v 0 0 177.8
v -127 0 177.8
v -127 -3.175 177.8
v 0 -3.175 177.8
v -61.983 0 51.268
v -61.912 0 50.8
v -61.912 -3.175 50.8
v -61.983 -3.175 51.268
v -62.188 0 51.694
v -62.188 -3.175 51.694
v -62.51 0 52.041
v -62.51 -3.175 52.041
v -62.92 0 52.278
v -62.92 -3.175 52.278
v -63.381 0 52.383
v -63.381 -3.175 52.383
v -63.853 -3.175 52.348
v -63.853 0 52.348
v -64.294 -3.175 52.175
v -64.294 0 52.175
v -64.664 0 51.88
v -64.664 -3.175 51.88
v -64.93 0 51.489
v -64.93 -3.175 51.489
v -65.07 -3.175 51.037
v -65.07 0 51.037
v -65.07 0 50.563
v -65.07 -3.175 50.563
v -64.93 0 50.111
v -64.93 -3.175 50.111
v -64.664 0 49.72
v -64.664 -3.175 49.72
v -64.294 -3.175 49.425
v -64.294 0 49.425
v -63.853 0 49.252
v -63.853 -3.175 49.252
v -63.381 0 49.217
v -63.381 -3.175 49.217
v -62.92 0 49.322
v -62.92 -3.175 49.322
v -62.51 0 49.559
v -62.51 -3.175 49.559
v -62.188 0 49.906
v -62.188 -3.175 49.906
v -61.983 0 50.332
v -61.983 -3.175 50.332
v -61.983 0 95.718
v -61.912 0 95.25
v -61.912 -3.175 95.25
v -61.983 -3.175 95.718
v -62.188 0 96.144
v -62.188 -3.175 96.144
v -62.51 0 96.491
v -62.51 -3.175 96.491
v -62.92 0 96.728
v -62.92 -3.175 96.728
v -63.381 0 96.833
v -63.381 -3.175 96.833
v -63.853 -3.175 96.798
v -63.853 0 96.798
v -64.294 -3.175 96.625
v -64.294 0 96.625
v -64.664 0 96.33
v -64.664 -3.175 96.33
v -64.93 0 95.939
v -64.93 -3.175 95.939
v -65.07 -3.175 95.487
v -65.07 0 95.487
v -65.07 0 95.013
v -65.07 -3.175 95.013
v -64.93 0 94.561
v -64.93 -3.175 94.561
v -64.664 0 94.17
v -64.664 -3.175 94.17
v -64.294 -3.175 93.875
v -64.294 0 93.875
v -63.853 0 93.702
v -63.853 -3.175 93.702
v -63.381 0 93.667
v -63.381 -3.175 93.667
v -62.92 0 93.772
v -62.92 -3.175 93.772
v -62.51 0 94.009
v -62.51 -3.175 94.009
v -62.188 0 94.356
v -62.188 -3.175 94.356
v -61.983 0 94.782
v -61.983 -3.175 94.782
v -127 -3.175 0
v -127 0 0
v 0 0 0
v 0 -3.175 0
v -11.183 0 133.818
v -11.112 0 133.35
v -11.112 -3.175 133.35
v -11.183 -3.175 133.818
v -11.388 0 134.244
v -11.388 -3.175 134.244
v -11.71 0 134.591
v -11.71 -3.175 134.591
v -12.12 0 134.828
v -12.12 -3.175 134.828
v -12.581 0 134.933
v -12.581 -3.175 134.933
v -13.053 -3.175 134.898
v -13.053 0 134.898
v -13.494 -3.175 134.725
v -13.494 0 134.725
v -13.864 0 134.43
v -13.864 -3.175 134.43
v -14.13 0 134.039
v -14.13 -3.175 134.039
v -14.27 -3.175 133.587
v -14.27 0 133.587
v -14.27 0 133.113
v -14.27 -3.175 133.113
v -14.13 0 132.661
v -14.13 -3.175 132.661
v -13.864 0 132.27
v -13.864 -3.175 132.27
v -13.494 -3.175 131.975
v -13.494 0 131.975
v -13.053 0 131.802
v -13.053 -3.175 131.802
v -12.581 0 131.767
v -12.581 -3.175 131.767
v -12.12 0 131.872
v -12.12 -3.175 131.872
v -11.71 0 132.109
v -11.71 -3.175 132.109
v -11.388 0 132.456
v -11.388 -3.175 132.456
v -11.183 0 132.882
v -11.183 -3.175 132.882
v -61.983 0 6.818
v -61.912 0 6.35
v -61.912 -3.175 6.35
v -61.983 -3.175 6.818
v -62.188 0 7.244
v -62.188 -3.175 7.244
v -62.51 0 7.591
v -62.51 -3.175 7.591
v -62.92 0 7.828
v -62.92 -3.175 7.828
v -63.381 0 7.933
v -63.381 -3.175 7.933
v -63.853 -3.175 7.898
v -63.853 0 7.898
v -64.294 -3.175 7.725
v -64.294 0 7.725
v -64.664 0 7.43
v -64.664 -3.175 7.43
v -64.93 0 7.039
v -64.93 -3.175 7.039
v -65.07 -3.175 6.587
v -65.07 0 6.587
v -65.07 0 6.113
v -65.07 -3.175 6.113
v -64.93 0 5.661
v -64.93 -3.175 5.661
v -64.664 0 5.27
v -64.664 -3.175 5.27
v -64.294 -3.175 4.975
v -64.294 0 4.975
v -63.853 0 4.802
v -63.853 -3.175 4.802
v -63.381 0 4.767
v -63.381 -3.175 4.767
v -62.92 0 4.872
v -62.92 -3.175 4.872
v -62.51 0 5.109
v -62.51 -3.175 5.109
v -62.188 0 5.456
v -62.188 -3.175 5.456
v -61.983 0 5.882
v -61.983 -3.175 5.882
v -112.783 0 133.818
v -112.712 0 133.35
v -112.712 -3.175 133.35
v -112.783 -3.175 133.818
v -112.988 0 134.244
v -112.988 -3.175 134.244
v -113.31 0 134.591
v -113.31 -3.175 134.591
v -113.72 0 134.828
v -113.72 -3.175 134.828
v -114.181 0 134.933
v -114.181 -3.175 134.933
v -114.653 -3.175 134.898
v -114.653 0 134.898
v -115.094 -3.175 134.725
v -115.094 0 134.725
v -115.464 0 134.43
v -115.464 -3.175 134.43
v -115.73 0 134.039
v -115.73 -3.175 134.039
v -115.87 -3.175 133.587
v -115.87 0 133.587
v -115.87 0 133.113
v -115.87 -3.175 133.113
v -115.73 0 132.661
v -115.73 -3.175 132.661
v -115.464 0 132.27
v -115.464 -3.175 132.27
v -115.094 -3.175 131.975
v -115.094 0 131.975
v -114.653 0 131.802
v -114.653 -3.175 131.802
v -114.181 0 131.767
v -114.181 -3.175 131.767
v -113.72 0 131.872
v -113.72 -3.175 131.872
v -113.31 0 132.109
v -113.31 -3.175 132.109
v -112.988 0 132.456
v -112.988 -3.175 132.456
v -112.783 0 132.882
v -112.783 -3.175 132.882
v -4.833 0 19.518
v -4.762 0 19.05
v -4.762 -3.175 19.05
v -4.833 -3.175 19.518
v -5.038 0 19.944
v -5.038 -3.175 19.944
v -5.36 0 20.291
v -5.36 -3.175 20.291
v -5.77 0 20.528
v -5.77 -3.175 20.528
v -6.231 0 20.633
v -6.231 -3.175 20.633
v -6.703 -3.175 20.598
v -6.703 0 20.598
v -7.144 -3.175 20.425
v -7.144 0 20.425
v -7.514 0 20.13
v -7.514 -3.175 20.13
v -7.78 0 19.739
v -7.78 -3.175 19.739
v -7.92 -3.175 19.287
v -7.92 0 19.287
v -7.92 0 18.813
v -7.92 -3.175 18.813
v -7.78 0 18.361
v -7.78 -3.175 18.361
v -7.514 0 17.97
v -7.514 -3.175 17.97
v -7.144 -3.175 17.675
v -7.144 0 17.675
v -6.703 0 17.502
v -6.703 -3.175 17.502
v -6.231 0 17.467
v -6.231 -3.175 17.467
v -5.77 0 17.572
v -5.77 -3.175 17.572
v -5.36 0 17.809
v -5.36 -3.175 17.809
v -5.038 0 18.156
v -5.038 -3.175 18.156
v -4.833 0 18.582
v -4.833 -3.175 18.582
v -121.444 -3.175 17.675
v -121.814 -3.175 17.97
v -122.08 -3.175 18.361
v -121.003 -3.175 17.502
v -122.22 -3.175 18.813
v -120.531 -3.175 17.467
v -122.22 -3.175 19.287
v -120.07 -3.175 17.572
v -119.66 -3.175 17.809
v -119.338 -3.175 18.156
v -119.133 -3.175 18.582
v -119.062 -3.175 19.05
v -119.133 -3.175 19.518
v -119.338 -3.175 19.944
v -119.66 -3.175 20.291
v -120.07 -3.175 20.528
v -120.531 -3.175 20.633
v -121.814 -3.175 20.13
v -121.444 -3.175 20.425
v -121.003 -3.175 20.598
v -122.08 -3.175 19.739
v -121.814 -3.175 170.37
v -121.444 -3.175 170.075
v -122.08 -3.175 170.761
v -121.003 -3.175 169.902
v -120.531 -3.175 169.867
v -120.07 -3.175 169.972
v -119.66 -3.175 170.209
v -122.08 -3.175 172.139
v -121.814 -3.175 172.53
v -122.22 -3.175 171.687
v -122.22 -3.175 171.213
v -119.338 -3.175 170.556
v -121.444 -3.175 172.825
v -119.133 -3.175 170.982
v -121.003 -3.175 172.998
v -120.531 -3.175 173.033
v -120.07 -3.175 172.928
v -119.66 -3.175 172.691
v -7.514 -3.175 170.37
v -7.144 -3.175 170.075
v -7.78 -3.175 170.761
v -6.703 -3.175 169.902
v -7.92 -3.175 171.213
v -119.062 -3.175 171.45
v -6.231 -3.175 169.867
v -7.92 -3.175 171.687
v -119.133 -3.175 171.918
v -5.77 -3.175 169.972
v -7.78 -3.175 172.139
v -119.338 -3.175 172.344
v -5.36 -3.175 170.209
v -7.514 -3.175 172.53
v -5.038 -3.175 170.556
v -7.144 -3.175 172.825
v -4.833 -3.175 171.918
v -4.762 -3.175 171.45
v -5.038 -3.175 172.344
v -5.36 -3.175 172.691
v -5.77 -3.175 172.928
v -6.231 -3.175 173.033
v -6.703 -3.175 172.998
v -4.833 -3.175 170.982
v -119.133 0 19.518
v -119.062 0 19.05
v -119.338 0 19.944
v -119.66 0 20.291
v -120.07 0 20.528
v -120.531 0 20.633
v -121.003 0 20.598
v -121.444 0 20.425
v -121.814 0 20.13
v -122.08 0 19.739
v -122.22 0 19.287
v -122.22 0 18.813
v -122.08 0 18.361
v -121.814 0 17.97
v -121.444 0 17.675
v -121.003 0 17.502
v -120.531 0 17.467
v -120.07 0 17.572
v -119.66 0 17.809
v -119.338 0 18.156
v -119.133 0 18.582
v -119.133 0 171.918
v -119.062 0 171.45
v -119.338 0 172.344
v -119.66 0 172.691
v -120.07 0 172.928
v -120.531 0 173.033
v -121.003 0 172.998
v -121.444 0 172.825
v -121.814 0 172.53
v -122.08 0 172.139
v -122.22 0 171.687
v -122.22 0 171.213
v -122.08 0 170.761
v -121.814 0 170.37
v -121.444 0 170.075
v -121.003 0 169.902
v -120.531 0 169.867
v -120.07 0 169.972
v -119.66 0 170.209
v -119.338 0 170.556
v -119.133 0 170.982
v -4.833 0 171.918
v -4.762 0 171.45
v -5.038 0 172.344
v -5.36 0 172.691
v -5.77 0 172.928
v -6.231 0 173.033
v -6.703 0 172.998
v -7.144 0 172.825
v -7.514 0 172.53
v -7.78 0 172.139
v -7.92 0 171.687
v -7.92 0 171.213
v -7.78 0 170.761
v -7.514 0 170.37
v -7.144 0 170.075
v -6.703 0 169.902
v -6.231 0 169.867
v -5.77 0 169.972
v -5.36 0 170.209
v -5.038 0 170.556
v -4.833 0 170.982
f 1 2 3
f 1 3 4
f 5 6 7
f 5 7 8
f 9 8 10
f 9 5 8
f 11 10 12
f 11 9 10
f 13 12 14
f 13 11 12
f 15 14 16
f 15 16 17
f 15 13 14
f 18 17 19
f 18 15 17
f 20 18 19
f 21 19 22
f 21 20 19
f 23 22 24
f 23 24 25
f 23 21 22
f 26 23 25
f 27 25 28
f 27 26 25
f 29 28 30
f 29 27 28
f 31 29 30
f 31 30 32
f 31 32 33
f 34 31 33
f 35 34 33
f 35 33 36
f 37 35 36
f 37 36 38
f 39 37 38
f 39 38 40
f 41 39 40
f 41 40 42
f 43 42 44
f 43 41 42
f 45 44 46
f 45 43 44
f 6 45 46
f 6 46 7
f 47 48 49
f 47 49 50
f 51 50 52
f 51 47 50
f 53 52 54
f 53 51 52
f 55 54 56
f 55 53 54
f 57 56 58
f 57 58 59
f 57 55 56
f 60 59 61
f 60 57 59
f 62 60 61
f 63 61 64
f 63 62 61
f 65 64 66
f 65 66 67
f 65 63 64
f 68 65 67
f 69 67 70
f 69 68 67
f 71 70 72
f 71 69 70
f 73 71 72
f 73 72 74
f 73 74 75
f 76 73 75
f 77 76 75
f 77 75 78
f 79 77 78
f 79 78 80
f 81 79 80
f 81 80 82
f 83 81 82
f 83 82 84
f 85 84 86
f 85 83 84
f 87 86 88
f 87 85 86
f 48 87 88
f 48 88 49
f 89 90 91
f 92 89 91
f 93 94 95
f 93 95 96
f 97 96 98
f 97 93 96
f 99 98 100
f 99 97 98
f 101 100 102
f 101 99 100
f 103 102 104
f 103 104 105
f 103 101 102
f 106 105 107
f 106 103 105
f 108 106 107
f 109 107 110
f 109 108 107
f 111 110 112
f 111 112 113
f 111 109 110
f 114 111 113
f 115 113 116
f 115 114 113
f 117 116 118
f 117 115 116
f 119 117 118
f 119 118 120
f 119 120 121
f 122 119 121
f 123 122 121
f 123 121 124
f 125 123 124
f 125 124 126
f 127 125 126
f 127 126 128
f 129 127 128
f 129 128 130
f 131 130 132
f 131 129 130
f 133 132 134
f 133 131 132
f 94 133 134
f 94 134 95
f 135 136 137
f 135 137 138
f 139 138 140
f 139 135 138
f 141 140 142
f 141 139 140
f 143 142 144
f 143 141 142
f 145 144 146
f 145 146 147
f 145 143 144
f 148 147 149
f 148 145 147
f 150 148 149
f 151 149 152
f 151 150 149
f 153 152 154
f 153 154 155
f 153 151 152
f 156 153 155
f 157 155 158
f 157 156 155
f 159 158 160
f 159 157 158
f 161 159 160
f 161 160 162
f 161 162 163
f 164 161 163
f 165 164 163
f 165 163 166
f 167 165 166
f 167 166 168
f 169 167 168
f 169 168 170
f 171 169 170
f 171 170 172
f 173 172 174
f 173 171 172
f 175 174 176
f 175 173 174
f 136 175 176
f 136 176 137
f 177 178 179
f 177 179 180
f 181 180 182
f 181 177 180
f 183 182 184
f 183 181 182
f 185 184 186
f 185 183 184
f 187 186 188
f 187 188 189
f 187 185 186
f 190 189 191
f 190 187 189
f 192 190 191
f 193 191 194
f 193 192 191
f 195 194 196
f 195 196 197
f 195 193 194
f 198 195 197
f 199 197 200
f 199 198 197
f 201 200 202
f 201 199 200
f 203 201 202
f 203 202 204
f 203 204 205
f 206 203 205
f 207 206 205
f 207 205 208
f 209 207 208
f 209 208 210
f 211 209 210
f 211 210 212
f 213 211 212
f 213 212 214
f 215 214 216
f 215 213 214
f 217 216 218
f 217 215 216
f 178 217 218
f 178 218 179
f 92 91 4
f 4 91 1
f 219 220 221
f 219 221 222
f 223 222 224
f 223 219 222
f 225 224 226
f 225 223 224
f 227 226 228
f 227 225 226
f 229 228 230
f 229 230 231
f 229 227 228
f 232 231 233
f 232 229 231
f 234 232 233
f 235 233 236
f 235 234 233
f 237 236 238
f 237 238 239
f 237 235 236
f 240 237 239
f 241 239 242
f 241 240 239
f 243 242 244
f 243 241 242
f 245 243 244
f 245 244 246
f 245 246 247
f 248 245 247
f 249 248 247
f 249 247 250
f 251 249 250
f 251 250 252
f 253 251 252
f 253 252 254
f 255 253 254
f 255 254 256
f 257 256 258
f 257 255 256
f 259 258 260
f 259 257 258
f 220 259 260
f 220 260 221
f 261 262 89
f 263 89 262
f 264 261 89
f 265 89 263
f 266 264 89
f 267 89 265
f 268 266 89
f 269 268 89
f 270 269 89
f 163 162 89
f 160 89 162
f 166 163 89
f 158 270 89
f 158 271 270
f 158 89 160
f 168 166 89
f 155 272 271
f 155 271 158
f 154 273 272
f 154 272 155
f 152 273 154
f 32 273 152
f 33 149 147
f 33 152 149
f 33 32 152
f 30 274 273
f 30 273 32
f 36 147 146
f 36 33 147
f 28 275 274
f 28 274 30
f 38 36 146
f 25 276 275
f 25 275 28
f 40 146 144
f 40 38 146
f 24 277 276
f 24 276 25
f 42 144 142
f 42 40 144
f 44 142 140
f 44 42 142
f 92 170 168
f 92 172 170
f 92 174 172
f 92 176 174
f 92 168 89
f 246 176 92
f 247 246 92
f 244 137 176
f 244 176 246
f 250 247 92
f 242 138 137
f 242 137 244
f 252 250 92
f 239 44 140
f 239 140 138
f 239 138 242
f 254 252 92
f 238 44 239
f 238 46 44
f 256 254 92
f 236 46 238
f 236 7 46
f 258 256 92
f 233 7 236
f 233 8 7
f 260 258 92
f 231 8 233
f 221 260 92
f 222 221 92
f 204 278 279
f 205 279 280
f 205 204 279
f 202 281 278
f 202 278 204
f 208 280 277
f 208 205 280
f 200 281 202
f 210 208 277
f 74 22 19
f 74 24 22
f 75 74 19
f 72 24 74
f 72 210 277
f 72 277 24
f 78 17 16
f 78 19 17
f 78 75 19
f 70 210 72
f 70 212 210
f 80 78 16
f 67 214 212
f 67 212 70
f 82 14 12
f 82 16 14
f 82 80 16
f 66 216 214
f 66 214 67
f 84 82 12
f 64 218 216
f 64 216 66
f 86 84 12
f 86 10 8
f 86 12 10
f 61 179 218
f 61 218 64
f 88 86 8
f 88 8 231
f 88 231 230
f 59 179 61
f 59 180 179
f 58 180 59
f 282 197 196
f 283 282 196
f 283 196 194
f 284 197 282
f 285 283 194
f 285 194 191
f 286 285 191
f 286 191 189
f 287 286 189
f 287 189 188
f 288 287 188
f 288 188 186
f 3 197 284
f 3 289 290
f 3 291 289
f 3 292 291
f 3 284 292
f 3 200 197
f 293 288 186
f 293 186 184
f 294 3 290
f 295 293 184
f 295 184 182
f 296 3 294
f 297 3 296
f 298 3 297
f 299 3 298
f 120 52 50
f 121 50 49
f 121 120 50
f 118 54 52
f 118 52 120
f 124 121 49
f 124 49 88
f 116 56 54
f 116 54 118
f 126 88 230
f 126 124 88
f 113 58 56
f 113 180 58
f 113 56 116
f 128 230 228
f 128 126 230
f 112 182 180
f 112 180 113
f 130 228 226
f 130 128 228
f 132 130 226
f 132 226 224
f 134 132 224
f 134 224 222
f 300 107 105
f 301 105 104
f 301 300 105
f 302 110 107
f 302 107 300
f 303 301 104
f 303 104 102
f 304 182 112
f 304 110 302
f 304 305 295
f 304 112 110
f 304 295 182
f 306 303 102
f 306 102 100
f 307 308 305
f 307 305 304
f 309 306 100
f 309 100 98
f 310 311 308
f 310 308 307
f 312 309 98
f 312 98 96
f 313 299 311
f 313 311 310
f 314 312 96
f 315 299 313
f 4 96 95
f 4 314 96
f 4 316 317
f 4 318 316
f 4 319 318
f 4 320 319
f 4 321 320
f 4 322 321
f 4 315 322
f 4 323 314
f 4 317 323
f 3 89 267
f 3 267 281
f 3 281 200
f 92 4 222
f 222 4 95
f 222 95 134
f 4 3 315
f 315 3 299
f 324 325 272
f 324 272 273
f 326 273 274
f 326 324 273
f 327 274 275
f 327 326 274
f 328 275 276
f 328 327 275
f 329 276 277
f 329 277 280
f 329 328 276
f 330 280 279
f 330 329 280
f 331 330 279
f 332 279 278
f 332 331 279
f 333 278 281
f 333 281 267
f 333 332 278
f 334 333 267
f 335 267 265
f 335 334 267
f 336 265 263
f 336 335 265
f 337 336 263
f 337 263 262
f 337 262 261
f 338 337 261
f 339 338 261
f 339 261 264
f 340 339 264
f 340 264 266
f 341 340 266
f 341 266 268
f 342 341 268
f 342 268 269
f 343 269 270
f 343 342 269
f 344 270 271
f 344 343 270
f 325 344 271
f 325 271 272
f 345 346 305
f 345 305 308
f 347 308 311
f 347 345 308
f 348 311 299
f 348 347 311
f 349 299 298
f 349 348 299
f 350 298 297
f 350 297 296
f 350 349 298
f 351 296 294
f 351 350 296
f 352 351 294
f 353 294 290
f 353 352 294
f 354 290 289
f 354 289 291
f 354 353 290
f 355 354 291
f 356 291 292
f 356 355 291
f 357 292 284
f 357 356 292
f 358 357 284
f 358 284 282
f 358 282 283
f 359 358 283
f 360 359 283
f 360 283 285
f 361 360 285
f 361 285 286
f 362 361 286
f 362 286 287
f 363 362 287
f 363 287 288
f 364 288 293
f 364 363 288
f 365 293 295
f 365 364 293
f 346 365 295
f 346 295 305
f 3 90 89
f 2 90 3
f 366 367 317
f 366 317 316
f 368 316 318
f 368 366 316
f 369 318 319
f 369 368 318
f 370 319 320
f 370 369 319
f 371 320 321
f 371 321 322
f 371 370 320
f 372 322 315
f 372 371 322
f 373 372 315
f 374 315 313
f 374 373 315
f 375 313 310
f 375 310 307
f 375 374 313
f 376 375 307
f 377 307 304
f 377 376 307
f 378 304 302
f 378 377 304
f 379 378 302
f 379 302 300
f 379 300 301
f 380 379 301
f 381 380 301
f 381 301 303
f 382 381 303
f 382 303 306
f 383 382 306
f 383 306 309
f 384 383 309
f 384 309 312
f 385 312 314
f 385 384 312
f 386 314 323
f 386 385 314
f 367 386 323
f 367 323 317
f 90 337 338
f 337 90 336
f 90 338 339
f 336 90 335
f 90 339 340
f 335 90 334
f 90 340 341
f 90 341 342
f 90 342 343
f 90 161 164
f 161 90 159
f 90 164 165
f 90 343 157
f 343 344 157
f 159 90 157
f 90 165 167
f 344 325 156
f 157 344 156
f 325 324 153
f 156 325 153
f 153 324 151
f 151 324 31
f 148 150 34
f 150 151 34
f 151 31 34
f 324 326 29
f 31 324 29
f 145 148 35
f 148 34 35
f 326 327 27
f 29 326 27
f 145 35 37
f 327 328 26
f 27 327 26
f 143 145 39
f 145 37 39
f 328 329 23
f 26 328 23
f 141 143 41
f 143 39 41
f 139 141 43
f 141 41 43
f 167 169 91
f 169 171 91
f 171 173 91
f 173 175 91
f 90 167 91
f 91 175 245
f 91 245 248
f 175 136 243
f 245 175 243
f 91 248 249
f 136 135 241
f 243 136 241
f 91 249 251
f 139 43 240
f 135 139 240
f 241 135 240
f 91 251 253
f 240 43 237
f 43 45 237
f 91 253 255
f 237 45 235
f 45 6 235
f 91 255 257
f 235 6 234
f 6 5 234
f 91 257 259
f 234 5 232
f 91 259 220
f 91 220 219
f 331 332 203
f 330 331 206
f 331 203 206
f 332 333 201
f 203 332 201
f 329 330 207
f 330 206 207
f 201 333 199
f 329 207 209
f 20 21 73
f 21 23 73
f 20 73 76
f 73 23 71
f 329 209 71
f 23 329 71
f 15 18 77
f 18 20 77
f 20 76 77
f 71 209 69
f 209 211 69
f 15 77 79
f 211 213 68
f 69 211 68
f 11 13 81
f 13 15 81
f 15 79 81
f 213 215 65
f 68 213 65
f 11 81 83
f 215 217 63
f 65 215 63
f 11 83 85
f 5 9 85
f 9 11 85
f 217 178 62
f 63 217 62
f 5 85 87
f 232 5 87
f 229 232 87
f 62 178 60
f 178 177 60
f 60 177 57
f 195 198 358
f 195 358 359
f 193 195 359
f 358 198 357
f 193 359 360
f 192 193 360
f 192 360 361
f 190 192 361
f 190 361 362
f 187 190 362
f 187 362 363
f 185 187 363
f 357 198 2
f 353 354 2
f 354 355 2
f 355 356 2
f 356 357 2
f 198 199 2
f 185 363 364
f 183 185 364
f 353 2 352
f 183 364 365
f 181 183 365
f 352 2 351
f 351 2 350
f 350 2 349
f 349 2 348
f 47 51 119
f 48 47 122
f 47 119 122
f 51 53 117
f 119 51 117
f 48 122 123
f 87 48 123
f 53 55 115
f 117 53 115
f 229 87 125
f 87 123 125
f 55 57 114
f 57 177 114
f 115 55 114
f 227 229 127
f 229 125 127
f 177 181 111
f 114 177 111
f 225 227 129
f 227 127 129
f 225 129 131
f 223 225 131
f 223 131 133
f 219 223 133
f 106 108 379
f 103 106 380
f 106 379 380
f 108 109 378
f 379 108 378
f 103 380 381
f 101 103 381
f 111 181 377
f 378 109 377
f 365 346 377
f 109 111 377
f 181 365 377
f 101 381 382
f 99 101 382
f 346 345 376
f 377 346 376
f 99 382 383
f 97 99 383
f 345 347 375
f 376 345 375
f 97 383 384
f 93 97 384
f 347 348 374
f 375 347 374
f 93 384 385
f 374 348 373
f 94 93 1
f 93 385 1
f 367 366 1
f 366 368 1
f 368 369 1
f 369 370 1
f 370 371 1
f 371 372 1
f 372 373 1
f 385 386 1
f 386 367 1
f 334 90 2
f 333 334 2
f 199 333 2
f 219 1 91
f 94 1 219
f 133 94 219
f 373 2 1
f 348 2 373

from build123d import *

# Parameters (mm, degrees)
F0_W     = 127
F0_H     = 177.8
F0_R     = 1.5875
F1_DEPTH = 3.175


with BuildPart() as f1:
    # F0 (on Front) → F1 (new body)
    with BuildSketch(Plane.XZ):
        with Locations((-63.5, 88.9)):
            Rectangle(F0_W, F0_H)
        with Locations((-120.65, 19.05)):
            Circle(F0_R, mode=Mode.SUBTRACT)
        with Locations((-63.5, 6.35)):
            Circle(F0_R, mode=Mode.SUBTRACT)
        with Locations((-6.35, 19.05)):
            Circle(F0_R, mode=Mode.SUBTRACT)
        with Locations((-63.5, 50.8)):
            Circle(F0_R, mode=Mode.SUBTRACT)
        with Locations((-114.3, 133.35)):
            Circle(F0_R, mode=Mode.SUBTRACT)
        with Locations((-120.65, 171.45)):
            Circle(F0_R, mode=Mode.SUBTRACT)
        with Locations((-63.5, 95.25)):
            Circle(F0_R, mode=Mode.SUBTRACT)
        with Locations((-12.7, 133.35)):
            Circle(F0_R, mode=Mode.SUBTRACT)
        with Locations((-6.35, 171.45)):
            Circle(F0_R, mode=Mode.SUBTRACT)
    extrude(amount=F1_DEPTH)


solid = f1.part
